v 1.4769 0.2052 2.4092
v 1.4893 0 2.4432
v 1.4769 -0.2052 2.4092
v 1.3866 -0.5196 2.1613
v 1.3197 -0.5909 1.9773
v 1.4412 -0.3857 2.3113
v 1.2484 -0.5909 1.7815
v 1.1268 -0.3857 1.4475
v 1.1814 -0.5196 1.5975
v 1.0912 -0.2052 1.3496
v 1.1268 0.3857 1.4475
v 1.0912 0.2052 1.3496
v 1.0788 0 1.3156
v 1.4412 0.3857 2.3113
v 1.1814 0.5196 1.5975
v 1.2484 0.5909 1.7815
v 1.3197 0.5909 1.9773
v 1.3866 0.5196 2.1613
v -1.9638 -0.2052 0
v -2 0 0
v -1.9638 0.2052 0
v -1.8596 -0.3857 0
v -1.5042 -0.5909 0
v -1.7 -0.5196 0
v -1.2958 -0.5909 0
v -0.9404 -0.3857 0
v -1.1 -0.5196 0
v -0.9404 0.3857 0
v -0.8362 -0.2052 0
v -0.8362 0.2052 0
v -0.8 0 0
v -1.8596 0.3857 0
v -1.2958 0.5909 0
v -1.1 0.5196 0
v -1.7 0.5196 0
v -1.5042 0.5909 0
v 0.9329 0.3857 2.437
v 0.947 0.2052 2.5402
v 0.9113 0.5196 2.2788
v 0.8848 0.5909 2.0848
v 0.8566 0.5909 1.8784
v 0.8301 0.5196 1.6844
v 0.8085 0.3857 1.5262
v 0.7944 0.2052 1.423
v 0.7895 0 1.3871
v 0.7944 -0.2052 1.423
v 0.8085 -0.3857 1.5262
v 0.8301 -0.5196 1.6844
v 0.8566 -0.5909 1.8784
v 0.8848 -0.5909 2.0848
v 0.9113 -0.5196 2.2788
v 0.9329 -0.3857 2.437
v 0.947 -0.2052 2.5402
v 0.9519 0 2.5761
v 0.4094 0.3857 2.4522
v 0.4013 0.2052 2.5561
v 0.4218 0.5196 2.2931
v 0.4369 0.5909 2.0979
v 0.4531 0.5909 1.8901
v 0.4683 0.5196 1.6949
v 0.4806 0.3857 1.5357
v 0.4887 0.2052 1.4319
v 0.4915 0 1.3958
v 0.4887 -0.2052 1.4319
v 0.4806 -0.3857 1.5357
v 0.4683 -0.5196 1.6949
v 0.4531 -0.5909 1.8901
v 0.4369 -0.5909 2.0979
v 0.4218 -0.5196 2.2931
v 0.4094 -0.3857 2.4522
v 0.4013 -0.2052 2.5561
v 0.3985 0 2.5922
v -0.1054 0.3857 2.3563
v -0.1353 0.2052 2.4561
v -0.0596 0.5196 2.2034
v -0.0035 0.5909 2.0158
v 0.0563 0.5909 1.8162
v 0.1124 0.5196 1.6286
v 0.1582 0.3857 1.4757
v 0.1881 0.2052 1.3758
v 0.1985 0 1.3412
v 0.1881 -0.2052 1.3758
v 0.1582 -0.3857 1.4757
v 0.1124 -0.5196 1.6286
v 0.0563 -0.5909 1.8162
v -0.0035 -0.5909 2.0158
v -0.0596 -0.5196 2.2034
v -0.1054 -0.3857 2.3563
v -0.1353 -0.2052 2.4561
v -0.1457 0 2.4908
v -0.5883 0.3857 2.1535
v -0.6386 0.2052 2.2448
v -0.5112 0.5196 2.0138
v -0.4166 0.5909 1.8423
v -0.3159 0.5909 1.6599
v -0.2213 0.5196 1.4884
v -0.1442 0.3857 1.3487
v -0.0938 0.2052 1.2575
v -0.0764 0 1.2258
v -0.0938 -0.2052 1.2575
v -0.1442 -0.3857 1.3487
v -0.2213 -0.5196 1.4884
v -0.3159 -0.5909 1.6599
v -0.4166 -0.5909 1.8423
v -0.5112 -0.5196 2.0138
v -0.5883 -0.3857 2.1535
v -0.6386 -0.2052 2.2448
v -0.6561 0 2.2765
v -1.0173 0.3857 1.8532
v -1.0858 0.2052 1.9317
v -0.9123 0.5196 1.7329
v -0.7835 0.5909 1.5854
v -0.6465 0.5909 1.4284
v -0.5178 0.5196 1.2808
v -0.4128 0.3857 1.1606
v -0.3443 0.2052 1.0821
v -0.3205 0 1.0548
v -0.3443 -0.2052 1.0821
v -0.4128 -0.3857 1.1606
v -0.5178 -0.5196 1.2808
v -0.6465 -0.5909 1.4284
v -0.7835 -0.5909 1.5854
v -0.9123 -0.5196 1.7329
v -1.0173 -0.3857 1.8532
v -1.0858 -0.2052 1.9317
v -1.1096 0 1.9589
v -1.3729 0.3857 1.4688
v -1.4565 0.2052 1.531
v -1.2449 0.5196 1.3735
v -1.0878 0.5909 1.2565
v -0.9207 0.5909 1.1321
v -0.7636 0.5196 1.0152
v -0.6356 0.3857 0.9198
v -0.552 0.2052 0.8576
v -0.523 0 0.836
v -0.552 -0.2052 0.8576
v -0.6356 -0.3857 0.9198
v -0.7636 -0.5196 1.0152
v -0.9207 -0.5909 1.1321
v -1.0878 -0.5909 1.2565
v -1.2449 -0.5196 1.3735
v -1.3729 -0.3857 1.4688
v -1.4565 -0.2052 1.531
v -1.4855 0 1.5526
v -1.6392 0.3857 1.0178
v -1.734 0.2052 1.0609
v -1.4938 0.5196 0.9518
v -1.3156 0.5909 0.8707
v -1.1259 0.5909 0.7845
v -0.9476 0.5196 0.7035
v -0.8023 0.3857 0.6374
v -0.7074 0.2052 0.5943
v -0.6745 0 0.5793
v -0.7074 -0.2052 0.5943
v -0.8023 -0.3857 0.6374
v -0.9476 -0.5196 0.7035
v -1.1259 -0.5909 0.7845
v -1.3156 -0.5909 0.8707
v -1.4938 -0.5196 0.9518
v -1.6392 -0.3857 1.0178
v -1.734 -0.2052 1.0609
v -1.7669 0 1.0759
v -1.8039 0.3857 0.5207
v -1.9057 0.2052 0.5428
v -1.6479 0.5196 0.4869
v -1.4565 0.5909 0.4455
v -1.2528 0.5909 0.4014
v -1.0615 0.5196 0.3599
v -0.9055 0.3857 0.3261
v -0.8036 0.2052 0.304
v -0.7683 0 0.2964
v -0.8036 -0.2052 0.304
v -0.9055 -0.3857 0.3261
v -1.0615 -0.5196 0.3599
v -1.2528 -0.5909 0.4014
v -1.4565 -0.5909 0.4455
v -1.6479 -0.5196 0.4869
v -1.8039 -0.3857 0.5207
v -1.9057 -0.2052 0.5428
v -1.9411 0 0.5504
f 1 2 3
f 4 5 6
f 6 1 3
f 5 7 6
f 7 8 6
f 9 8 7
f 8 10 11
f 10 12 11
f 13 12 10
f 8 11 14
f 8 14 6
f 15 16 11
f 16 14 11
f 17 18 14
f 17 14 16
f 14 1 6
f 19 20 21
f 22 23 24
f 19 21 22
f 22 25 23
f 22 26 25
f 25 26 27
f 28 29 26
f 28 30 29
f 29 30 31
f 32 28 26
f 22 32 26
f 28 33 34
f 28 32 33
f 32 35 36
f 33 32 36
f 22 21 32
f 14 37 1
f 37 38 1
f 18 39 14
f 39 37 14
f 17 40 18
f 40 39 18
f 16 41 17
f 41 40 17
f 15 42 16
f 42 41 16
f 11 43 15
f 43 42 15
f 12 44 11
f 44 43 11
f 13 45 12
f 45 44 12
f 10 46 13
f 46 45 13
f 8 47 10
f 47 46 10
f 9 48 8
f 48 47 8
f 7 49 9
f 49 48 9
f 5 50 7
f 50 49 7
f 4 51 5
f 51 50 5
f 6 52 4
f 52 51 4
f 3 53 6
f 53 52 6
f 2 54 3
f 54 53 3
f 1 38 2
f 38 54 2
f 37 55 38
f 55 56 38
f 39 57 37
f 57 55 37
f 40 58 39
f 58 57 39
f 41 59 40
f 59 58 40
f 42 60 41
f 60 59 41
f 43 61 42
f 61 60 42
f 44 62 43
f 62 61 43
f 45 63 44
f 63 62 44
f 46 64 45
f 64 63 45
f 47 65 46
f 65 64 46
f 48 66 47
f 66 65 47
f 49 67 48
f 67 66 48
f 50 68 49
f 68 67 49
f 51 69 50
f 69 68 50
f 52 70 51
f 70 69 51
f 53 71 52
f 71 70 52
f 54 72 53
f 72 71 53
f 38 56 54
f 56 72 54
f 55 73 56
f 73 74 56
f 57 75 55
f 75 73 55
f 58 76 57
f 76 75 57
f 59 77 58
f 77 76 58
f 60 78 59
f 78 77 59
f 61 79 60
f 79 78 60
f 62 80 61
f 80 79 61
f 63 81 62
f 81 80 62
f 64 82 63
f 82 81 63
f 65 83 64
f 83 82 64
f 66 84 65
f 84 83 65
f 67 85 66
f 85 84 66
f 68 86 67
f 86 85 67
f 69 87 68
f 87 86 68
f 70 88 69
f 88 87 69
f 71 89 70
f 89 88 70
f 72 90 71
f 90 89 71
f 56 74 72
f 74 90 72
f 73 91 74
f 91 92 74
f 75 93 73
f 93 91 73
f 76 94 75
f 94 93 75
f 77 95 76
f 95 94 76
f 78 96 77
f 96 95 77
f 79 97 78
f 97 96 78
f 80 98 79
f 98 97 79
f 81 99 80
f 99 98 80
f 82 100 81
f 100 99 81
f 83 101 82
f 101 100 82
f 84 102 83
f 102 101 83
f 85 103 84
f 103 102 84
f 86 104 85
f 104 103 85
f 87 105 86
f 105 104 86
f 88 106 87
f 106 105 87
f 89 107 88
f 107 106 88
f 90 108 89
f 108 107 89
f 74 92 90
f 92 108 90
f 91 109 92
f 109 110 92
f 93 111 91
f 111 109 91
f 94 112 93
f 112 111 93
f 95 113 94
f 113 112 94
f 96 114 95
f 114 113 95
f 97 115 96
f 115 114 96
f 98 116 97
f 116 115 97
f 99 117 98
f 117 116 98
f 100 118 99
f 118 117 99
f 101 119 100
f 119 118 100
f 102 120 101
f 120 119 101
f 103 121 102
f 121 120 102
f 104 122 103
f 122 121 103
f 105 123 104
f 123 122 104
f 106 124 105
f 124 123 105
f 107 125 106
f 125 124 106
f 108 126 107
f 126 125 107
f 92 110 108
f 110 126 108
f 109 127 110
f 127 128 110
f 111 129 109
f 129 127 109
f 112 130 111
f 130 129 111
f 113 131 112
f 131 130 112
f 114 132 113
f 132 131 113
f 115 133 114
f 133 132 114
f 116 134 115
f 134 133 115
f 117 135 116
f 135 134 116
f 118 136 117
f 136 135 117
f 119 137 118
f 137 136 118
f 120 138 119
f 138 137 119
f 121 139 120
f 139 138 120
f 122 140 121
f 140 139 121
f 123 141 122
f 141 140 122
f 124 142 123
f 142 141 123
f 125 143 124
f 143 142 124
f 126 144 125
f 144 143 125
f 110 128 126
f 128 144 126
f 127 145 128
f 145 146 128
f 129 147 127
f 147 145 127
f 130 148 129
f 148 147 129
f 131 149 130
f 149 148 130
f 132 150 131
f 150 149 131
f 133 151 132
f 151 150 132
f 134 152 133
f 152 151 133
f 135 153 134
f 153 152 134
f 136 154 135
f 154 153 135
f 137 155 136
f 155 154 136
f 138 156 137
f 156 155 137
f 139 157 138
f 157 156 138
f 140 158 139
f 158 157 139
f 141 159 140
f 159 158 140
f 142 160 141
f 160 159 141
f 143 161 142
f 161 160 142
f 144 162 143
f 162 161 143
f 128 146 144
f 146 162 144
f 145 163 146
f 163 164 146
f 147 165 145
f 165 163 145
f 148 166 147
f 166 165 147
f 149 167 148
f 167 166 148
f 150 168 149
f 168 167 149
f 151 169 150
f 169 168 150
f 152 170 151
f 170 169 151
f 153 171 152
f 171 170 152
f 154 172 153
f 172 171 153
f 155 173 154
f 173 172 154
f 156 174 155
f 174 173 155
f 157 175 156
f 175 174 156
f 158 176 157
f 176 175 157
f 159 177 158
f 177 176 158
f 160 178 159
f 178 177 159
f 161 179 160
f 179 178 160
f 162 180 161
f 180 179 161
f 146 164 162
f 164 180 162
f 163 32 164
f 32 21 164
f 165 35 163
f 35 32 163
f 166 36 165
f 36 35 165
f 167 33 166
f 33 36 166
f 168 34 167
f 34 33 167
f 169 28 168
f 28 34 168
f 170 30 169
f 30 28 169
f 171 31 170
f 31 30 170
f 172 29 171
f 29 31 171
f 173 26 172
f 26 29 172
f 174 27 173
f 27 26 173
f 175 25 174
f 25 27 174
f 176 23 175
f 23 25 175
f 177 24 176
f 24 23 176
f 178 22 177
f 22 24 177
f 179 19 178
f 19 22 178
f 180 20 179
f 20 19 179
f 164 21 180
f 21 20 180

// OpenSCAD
//=============================================================================
// 3D icon used for BendTool. 
// =============================================================================

module ConvertBendIcon() {
  bend = 110;
  translate([.6, 0, 0])
    rotate ([90, bend - 180, 0])
    rotate_extrude(angle = bend, convexity = 10, $fn = 32)
    translate([2, 0, 0]) circle(r = .6, $fn = 18);
}

ConvertBendIcon();
